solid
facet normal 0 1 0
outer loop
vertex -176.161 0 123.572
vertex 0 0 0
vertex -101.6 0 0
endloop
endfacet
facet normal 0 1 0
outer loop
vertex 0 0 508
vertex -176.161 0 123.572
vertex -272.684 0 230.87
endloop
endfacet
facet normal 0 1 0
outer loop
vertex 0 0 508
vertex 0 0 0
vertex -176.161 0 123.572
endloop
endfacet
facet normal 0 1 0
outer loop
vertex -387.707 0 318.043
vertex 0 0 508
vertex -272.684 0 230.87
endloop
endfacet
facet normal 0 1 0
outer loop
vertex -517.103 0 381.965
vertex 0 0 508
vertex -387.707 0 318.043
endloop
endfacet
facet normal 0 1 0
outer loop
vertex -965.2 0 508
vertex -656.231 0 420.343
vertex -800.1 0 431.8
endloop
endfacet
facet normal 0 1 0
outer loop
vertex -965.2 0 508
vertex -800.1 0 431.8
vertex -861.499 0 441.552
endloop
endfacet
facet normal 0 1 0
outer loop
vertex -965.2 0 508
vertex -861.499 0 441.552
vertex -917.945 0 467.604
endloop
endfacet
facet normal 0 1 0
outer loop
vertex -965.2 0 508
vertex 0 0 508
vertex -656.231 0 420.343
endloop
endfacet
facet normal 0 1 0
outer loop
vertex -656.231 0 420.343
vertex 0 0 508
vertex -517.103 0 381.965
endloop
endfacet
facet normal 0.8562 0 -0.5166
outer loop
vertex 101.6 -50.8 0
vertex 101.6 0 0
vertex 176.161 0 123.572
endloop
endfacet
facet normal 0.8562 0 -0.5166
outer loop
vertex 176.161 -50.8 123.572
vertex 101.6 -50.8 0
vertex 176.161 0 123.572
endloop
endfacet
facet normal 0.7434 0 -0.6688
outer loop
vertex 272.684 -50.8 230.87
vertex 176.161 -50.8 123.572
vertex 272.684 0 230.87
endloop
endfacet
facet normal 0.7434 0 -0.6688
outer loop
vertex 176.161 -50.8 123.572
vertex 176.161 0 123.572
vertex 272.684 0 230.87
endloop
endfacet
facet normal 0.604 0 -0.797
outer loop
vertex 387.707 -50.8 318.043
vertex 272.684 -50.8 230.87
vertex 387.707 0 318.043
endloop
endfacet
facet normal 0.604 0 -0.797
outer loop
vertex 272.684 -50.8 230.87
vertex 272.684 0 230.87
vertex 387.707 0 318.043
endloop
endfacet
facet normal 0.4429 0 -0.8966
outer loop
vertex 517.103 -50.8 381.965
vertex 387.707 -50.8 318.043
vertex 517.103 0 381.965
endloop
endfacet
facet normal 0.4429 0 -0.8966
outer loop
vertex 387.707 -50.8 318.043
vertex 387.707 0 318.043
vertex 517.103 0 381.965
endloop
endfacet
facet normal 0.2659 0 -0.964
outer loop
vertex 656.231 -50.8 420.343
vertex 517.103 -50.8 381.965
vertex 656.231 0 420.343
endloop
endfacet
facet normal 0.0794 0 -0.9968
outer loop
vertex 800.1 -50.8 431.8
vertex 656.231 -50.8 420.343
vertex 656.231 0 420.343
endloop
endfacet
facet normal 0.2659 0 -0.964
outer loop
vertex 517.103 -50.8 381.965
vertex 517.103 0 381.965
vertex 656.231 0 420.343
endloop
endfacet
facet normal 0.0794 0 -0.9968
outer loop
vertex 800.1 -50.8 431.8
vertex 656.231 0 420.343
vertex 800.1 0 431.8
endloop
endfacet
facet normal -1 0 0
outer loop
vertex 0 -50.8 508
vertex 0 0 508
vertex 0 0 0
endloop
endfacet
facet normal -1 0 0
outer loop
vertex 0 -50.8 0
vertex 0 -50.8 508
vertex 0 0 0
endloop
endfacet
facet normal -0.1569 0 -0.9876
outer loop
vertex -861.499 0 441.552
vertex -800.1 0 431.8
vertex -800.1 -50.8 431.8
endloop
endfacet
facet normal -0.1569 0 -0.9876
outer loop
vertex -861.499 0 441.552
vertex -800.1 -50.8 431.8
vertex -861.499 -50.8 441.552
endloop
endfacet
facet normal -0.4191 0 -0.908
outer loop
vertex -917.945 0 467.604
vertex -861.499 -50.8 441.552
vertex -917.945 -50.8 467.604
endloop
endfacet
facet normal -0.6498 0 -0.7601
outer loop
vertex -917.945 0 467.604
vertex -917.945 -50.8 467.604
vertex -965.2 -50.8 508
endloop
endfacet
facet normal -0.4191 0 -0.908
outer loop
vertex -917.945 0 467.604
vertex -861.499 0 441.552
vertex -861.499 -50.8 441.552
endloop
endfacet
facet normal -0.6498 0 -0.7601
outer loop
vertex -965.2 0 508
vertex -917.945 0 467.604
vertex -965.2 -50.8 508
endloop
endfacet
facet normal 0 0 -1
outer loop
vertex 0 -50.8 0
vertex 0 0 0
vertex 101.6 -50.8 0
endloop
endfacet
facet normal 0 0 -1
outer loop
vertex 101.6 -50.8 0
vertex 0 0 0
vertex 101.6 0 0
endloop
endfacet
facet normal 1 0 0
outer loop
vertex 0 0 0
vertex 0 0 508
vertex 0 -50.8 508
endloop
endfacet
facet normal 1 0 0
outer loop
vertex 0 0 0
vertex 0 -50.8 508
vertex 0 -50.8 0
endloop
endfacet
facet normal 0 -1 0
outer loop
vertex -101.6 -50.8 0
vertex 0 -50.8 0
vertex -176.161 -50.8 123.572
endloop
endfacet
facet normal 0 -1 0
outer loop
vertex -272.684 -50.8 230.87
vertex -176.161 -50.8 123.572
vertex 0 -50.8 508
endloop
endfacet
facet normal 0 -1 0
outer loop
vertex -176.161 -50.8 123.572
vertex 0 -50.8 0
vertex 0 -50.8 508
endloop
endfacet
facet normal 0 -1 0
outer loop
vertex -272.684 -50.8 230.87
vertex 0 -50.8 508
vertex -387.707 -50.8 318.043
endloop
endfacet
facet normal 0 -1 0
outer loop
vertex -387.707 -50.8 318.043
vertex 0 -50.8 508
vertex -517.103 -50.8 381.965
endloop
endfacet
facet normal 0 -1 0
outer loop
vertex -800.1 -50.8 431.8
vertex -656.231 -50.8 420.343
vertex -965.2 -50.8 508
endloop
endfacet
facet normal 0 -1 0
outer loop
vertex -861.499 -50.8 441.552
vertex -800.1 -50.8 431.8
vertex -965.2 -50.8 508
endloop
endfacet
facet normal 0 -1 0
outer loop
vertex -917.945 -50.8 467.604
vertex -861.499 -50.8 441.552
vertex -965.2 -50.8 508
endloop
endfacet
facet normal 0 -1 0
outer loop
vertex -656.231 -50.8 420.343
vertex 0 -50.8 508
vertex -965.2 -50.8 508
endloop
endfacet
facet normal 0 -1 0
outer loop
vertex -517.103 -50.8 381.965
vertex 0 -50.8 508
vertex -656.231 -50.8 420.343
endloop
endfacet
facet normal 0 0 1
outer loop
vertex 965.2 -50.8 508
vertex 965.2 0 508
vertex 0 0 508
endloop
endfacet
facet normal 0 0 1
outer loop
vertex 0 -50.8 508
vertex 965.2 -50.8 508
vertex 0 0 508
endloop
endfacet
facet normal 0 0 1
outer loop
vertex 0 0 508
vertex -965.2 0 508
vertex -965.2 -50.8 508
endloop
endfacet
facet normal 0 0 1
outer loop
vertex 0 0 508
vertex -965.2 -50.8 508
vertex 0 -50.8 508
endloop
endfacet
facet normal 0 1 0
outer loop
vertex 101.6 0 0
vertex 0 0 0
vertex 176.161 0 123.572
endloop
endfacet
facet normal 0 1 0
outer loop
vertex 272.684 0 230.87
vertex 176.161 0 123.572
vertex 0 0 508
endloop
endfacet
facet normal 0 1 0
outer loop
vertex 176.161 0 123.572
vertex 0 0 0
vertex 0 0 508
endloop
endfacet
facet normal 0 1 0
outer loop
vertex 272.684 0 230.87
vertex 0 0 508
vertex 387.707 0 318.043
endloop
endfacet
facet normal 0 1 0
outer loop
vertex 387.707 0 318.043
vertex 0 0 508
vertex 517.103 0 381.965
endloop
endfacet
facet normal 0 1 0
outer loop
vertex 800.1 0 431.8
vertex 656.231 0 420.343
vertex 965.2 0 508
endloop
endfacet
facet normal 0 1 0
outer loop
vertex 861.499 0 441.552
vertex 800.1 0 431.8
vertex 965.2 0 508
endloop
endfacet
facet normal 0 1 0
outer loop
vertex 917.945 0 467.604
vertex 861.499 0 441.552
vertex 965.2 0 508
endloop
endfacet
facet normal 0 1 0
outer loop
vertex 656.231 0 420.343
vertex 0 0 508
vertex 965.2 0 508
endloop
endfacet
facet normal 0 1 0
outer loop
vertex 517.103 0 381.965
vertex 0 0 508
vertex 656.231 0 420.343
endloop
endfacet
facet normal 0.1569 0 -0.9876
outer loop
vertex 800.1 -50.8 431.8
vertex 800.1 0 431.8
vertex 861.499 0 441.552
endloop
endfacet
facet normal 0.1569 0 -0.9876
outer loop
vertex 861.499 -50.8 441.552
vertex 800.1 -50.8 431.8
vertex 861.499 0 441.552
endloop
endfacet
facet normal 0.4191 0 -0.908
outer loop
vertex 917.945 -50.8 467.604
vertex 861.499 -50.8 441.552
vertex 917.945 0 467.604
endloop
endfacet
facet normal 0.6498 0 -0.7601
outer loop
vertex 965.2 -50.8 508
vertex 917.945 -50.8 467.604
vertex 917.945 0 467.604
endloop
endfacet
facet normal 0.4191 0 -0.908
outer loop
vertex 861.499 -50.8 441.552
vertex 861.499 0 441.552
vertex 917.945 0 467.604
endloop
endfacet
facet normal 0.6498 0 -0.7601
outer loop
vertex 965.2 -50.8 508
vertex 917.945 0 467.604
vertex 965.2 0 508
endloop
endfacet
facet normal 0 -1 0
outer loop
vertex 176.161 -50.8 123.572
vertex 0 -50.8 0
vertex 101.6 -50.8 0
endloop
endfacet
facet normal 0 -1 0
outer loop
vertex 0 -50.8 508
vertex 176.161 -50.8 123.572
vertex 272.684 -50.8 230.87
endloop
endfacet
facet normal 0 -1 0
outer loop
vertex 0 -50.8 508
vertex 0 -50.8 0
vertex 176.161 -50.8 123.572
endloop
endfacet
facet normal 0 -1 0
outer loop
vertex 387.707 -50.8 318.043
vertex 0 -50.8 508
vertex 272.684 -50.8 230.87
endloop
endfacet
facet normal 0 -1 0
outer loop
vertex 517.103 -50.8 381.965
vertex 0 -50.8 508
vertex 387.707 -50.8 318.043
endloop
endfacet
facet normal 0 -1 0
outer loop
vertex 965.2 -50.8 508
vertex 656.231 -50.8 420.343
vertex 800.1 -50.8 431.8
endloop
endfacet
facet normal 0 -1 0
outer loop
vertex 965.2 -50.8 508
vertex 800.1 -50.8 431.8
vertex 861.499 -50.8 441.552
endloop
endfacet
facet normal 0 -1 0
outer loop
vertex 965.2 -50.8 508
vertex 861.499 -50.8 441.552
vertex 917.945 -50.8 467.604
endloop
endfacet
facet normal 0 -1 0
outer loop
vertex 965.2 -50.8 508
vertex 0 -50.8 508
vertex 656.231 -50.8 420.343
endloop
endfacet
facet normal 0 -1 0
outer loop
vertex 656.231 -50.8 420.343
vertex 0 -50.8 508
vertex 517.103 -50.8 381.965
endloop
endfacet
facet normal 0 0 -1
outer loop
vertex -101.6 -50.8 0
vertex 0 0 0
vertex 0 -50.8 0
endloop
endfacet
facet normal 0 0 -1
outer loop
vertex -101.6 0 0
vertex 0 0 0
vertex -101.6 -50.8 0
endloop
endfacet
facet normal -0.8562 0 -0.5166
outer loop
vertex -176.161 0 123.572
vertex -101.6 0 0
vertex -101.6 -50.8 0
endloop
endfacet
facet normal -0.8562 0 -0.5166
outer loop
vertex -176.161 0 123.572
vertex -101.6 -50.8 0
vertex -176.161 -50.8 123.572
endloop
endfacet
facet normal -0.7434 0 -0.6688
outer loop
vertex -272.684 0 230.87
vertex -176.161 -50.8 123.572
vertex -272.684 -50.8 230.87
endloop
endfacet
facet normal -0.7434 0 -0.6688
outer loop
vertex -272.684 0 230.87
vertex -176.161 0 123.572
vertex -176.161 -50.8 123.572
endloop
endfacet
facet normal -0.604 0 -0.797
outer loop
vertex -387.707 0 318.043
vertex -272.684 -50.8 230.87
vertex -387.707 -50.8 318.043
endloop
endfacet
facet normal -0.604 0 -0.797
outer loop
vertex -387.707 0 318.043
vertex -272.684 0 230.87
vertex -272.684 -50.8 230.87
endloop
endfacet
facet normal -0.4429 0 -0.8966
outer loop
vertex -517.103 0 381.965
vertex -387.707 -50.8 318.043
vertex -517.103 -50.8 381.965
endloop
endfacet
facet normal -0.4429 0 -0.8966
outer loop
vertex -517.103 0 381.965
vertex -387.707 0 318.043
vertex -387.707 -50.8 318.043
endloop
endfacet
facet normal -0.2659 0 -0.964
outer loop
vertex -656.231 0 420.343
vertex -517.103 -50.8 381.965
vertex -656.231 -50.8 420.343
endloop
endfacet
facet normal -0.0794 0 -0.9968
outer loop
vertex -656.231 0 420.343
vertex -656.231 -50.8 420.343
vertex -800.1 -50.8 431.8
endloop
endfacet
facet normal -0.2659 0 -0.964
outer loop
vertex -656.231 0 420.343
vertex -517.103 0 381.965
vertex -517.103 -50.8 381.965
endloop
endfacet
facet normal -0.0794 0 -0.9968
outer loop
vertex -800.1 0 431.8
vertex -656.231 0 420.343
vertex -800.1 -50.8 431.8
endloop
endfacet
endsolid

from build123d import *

# Parameters (mm, degrees)
F1_DEPTH = 50.8


with BuildPart() as f1:
    # F0 (on Front) → F1 (new body)
    with BuildSketch(Plane.XZ):
        with BuildLine():
            Line((800.1, 508), (0, 508))
            Line((0, 508), (0, 0))
            Line((0, 0), (101.6, 0))
            ThreePointArc((101.6, 0), (387.706965, 318.043145), (800.1, 431.8))
            Line((800.1, 431.8), (800.1, 508))
        make_face()
        with BuildLine():
            Line((965.2, 508), (800.1, 508))
            Line((800.1, 508), (800.1, 431.8))
            ThreePointArc((800.1, 431.8), (890.618407, 452.635118), (965.2, 508))
        make_face()
    extrude(amount=F1_DEPTH)


with BuildPart() as f2_1:
    # F2: instance of F1
    add(f1.part.mirror(Plane.YZ))


solid = Compound([f1.part, f2_1.part])
